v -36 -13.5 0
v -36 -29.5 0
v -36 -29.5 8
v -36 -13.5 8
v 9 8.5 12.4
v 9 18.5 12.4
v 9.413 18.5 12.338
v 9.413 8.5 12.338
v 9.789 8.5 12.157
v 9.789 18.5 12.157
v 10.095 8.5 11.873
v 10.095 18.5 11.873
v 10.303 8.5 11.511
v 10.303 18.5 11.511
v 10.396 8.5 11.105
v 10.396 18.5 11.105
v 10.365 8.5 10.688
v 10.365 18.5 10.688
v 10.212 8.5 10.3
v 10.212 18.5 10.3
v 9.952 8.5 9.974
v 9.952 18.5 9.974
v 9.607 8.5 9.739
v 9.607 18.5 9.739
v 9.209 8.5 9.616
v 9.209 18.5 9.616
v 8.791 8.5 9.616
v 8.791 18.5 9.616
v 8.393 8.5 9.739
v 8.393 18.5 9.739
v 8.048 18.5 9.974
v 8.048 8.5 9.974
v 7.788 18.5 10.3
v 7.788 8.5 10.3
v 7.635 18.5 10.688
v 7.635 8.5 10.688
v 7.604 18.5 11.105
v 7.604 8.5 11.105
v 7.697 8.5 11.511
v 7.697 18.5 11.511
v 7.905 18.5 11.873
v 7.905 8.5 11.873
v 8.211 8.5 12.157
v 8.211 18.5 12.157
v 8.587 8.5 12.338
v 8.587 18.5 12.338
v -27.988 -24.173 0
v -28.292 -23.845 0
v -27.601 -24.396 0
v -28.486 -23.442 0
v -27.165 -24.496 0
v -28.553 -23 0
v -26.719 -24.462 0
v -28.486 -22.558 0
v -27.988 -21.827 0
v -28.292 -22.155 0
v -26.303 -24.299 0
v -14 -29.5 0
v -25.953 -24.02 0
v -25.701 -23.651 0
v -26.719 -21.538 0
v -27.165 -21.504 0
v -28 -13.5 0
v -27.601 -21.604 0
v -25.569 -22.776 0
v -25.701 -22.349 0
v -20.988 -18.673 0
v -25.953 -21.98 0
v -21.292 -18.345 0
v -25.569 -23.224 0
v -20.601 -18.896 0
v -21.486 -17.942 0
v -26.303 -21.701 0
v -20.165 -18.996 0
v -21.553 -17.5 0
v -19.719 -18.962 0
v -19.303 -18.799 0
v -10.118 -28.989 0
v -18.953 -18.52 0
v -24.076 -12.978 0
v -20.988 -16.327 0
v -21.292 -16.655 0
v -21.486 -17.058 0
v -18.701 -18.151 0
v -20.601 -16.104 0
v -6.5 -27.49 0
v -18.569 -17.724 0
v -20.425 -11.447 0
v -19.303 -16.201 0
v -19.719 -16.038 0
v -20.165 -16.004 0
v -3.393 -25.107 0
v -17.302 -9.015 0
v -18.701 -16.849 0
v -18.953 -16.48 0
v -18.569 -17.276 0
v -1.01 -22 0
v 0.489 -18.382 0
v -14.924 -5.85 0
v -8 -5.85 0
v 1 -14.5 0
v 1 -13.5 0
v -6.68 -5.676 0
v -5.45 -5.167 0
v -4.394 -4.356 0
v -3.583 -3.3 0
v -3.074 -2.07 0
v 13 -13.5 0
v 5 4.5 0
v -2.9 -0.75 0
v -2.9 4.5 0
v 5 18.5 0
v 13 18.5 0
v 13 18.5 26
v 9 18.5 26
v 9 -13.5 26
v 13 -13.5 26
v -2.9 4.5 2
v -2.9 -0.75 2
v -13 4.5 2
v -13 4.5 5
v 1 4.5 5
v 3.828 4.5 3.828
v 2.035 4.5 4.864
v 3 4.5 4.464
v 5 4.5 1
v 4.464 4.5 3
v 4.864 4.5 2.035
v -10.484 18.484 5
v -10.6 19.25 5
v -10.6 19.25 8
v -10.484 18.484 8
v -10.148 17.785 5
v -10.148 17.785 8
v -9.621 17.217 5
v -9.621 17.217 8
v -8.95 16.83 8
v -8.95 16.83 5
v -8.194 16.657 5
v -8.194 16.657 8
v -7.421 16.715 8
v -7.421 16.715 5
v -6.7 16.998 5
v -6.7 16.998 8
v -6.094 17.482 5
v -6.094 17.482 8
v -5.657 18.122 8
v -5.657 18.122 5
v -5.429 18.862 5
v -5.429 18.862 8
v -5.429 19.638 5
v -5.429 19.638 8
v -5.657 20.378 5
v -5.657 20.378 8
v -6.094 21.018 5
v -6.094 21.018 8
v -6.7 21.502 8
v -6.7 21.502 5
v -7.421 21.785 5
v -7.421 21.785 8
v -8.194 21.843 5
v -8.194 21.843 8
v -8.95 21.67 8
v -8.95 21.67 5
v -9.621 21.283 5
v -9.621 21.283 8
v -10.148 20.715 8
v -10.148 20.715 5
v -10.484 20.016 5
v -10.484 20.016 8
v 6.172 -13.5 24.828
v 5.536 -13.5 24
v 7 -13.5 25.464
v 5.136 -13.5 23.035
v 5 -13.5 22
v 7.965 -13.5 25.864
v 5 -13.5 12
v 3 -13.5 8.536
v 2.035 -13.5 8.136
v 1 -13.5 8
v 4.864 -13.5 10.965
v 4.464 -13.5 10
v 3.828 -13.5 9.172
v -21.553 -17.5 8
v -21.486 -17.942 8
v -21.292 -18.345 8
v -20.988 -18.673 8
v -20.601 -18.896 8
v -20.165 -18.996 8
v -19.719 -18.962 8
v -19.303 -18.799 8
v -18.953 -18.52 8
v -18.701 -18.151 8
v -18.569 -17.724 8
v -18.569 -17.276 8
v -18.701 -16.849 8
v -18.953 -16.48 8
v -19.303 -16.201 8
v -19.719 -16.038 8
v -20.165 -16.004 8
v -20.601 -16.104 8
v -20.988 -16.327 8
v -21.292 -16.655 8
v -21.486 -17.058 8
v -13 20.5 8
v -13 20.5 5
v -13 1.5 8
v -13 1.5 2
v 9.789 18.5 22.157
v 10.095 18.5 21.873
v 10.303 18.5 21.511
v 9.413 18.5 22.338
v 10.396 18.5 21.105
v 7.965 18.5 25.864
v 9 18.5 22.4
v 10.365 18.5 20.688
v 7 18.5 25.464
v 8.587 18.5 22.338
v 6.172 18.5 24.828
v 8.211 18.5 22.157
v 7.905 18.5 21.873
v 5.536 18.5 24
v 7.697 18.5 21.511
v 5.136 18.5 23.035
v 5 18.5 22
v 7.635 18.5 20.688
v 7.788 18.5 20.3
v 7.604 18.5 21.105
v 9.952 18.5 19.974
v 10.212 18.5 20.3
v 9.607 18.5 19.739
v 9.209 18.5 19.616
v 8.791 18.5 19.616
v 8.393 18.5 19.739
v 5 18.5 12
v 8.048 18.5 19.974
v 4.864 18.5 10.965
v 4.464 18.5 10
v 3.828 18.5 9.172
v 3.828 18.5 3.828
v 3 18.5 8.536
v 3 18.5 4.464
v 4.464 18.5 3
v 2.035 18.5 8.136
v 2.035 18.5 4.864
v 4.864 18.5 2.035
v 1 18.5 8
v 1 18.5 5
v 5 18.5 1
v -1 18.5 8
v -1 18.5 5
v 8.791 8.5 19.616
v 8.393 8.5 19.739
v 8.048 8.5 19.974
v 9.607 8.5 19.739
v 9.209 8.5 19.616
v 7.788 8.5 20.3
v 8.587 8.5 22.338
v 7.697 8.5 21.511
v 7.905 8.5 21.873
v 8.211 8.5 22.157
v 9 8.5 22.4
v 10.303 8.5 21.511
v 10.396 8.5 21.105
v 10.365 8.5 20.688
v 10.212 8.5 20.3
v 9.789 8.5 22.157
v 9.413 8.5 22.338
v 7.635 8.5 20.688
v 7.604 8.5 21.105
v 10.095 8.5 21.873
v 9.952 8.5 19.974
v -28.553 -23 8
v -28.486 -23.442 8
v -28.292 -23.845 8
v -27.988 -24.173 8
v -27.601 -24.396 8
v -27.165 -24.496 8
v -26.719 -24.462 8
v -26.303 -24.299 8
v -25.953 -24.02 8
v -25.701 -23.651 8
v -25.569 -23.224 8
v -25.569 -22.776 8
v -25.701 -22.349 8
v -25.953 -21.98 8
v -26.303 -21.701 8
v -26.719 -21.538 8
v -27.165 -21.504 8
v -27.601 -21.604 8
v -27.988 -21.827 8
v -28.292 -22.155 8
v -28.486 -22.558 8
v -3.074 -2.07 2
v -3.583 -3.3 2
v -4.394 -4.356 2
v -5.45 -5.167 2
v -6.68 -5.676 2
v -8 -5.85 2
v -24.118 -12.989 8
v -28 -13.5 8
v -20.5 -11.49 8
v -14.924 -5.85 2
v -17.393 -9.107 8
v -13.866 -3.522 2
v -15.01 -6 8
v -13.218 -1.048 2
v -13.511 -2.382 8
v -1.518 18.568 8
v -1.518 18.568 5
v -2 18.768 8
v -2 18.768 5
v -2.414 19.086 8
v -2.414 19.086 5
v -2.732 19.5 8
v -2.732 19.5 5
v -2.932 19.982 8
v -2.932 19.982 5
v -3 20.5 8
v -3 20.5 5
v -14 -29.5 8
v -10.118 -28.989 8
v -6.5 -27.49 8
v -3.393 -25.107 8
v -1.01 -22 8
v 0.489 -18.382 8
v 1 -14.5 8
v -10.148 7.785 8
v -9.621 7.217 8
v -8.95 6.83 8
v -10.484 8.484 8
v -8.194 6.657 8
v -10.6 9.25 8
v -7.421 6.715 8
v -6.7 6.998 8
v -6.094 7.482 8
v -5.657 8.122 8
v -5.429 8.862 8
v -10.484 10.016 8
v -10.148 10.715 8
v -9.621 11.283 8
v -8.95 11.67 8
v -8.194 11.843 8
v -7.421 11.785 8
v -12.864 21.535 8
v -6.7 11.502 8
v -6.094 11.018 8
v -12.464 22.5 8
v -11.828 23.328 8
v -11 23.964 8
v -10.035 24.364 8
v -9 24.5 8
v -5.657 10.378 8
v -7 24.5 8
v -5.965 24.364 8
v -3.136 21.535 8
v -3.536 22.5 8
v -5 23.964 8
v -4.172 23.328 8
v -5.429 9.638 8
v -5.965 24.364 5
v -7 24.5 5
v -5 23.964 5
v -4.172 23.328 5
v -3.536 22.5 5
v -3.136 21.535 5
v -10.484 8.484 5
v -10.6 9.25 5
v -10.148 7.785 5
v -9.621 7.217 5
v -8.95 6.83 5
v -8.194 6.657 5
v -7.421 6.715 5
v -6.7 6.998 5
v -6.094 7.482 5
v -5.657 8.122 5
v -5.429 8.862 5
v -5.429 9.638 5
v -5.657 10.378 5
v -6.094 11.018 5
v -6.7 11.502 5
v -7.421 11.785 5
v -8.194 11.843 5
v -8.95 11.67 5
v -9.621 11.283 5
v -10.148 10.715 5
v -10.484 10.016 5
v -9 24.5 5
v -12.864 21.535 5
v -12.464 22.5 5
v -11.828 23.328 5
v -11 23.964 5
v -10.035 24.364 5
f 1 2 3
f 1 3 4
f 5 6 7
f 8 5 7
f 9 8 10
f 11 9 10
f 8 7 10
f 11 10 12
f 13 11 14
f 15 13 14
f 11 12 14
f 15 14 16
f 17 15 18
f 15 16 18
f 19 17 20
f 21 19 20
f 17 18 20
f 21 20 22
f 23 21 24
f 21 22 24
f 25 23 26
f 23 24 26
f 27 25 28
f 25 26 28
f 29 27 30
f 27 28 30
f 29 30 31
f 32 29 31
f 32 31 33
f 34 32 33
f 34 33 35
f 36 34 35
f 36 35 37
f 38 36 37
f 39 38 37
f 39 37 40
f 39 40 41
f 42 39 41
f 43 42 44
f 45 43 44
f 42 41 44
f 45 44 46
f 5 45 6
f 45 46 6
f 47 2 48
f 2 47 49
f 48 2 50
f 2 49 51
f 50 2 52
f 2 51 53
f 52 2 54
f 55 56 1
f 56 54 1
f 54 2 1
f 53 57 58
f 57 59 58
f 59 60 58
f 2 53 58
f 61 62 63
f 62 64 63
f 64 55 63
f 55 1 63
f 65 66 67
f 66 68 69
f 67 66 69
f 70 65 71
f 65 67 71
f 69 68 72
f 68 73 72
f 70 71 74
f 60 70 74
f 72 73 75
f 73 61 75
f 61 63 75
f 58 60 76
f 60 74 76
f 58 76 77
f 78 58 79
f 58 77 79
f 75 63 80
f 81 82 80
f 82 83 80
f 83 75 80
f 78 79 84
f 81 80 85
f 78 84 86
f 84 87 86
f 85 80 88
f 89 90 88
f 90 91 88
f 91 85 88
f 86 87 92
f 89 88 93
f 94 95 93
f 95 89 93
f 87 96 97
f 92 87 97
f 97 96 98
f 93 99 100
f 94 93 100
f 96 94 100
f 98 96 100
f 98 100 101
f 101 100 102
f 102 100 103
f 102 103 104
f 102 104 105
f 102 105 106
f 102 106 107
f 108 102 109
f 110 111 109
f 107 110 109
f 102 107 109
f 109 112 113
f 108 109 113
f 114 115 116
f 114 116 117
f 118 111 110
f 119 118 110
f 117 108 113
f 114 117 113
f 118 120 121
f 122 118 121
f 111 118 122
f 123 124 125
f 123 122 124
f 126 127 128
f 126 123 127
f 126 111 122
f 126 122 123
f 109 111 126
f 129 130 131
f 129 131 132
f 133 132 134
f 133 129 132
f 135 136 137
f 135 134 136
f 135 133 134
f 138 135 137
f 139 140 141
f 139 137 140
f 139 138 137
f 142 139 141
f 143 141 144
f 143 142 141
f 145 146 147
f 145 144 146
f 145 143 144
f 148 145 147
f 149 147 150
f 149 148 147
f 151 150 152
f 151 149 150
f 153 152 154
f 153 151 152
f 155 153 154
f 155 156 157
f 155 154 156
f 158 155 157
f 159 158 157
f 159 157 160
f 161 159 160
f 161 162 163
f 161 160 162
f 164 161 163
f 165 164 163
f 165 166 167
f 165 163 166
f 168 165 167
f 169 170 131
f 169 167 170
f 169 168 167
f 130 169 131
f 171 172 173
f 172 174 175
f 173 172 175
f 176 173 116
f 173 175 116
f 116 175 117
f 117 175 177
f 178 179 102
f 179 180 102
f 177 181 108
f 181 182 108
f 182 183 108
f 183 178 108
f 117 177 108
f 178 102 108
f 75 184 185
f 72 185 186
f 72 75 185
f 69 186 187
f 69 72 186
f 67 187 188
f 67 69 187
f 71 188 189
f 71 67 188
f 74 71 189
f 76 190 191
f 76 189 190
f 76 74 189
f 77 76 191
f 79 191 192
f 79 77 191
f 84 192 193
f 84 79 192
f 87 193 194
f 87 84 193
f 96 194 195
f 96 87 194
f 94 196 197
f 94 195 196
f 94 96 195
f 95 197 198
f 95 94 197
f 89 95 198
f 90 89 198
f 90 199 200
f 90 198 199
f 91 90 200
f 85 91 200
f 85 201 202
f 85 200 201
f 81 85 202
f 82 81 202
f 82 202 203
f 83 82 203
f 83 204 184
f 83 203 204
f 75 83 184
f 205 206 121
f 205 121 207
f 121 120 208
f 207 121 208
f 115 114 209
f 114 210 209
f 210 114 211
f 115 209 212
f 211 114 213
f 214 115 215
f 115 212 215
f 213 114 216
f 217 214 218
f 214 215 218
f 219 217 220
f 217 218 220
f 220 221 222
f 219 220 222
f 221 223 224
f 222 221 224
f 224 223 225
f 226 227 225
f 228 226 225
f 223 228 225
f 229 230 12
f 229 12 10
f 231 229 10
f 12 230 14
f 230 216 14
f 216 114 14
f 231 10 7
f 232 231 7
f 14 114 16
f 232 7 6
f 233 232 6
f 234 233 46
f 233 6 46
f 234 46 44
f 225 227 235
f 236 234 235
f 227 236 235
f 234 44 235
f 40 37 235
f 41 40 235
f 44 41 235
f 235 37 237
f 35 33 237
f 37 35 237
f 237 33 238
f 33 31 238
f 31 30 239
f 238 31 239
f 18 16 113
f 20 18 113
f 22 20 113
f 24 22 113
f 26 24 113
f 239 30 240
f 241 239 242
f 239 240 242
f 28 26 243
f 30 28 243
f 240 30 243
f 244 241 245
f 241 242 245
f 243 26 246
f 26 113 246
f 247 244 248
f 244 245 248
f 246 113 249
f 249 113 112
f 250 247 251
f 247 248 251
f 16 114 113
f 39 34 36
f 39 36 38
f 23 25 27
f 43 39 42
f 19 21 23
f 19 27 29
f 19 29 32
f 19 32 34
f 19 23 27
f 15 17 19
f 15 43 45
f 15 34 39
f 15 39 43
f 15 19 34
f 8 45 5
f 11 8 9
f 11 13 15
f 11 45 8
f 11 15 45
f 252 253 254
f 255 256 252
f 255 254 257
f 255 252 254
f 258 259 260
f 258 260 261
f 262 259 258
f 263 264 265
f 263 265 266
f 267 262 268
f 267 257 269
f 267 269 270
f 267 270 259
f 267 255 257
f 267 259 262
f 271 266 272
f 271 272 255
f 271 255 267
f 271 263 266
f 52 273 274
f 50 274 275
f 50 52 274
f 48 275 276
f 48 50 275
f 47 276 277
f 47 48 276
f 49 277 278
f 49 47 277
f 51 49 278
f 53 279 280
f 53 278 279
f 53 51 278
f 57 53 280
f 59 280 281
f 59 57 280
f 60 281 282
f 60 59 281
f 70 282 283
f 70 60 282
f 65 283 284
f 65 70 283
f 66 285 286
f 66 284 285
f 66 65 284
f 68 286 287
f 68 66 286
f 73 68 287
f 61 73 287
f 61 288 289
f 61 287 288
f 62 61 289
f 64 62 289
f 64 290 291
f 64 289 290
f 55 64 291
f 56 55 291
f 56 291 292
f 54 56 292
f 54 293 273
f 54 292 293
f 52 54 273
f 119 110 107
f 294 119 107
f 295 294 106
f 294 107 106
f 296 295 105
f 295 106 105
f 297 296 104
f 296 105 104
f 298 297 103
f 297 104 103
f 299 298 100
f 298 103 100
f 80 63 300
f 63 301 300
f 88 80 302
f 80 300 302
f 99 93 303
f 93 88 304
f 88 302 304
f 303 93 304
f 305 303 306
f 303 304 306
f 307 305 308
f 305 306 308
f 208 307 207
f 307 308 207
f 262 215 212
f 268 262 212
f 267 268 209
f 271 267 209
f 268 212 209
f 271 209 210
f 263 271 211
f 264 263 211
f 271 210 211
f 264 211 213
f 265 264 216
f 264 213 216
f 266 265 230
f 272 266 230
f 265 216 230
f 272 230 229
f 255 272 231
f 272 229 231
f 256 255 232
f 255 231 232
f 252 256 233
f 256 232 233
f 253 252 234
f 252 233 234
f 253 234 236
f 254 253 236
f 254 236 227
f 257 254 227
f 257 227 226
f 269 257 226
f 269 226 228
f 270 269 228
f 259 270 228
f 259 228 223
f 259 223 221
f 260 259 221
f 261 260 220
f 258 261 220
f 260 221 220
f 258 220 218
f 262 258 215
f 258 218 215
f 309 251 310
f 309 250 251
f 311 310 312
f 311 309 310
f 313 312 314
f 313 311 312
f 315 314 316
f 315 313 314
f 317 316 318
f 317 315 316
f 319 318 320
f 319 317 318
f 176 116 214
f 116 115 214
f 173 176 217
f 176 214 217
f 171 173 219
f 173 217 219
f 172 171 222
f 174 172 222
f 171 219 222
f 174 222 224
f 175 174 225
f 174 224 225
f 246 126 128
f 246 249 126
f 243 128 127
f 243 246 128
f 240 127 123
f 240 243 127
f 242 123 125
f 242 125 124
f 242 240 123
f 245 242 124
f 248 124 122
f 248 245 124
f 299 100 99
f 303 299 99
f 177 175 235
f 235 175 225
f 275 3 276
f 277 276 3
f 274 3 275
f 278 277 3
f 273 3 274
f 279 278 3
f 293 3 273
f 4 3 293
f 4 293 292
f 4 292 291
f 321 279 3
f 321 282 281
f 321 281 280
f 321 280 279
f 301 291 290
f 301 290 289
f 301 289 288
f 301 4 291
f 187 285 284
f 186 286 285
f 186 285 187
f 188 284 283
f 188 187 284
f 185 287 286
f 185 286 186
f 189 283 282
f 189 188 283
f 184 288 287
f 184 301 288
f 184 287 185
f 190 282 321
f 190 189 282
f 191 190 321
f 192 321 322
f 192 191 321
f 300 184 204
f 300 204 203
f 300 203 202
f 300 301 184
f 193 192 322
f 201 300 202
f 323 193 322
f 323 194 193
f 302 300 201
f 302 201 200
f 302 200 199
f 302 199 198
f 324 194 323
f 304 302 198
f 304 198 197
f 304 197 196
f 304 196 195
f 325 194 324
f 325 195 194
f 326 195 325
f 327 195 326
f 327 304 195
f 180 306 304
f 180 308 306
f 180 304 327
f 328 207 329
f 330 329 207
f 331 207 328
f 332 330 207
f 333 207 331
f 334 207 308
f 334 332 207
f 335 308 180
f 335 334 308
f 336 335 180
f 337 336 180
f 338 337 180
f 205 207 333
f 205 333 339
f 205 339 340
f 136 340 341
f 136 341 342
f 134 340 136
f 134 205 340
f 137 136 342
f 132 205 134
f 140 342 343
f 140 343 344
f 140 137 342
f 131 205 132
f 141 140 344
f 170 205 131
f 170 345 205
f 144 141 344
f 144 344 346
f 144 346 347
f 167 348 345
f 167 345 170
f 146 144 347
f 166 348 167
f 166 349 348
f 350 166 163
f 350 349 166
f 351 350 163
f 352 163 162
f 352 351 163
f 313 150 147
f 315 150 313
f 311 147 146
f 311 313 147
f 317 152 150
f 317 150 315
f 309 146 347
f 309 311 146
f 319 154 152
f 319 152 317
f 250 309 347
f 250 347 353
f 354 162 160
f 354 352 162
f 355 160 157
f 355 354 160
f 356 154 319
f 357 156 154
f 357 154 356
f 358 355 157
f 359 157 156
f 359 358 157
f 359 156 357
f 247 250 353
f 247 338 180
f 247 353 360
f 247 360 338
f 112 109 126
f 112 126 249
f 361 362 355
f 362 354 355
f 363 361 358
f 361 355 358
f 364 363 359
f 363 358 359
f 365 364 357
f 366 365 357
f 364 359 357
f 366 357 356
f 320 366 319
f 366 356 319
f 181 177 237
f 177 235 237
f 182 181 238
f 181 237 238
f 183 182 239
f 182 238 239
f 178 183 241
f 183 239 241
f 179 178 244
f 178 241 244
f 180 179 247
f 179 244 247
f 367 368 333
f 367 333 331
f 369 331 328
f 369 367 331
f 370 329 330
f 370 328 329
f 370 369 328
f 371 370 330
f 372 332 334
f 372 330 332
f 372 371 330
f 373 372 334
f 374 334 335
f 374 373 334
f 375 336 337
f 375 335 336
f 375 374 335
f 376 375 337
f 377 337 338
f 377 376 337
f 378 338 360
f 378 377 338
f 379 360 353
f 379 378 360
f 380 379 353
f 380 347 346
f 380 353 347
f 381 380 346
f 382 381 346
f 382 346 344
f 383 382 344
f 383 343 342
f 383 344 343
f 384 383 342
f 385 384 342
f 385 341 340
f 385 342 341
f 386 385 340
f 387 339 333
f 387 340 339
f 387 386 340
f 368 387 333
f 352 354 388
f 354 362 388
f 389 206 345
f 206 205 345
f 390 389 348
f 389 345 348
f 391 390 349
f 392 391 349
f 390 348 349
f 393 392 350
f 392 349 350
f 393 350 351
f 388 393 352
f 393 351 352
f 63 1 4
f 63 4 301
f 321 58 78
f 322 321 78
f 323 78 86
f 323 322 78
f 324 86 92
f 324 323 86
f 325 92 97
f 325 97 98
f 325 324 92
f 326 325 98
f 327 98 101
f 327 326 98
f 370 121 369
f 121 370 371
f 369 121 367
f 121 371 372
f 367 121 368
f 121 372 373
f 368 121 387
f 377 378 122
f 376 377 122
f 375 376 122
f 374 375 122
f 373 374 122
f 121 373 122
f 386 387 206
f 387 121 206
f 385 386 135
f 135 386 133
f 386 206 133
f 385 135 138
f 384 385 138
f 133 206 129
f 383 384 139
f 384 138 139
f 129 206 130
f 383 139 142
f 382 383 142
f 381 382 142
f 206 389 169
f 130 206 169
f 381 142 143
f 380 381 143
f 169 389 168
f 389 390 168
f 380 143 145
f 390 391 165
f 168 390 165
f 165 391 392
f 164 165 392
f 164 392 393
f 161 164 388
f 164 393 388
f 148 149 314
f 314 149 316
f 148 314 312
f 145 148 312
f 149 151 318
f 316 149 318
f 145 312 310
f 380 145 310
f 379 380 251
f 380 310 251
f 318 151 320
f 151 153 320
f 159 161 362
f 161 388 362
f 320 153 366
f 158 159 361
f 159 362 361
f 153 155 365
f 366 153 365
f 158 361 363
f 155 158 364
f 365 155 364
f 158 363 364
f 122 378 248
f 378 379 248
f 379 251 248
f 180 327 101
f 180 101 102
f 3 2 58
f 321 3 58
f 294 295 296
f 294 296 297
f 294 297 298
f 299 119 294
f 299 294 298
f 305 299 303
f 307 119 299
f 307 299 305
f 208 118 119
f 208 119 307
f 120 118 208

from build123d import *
from OCP.BRepFilletAPI import BRepFilletAPI_MakeFillet

# Parameters (mm, degrees)
SKETCH1_R           = 2.6
BOSS_EXTRUDE1_DEPTH = 26
SKETCH2_W           = 18
SKETCH2_H           = 20
CUT_EXTRUDE1_DEPTH  = 5
CUT_EXTRUDE2_START  = 26
SKETCH3_W           = 18
SKETCH3_H           = 38
CUT_EXTRUDE2_DEPTH  = 18
CUT_EXTRUDE3_START  = 18.5
SKETCH4_R           = 1.4
CUT_EXTRUDE3_DEPTH  = 10
FILLET1_R           = 4
FILLET1_R_2         = 2
CUT_EXTRUDE4_DEPTH  = 2
SKETCH6_W           = 37
SKETCH6_H           = 16
BOSS_EXTRUDE2_DEPTH = 8
FILLET2_R           = 15
SKETCH7_R           = 1.5
CUT_EXTRUDE5_DEPTH  = 22


with BuildPart() as part:
    # Sketch1 → Boss-Extrude1 (new body)
    with BuildSketch(Plane.XY):
        Polygon((-13, -13.5), (13, -13.5), (13, 18.5), (-3, 18.5), (-3, 24.5), (-13, 24.5), (-13, 13.5), align=None)
        with Locations(Location((-8, 19.25, 0), (0, 0, 180))):
            Circle(SKETCH1_R, mode=Mode.SUBTRACT)
        with Locations(Location((-8, 9.25, 0), (0, 0, 180))):
            Circle(SKETCH1_R, mode=Mode.SUBTRACT)
    extrude(amount=BOSS_EXTRUDE1_DEPTH)

    # Sketch2 → Cut-Extrude1 (cut)
    with BuildSketch(Plane.XY):
        with Locations((-4, 14.5)):
            Rectangle(SKETCH2_W, SKETCH2_H)
    extrude(amount=CUT_EXTRUDE1_DEPTH, mode=Mode.SUBTRACT)

    # Sketch3 → Cut-Extrude2 (cut)
    with BuildSketch(Plane.XY.offset(CUT_EXTRUDE2_START)):
        with Locations((-4, 5.5)):
            Rectangle(SKETCH3_W, SKETCH3_H)
    extrude(amount=-CUT_EXTRUDE2_DEPTH, mode=Mode.SUBTRACT)

    # Sketch4 → Cut-Extrude3 (cut)
    with BuildSketch(Plane(origin=(0, 0, 0), x_dir=(1, 0, 0), z_dir=(0, 1, 0)).offset(CUT_EXTRUDE3_START)):
        with Locations(Location((9, -11, 0), (0, 0, 270))):
            Circle(SKETCH4_R)
        with Locations(Location((9, -21, 0), (0, 0, 270))):
            Circle(SKETCH4_R)
    extrude(amount=-CUT_EXTRUDE3_DEPTH, mode=Mode.SUBTRACT)

    # Fillet1
    fillet1_edges_1 = [part.edges().sort_by_distance(p)[0] for p in [
        (-3, 24.5, 6.5),
        (-13, 24.5, 6.5),
        (5, 11.5, 5),
        (5, 2.5, 8),
        (5, 2.5, 26),
    ]]
    fillet1_edges_2 = [part.edges().sort_by_distance(p)[0] for p in [
        (-3, 18.5, 6.5),
    ]]
    fillet1 = BRepFilletAPI_MakeFillet(part.part.solid().wrapped)
    for e in fillet1_edges_1:
        fillet1.Add(FILLET1_R - 0.0001, e.wrapped)
    for e in fillet1_edges_2:
        fillet1.Add(FILLET1_R_2 - 0.0001, e.wrapped)
    add(Compound.cast(fillet1.Shape()), mode=Mode.REPLACE)  # a hair under: the kernel refuses the full size

    # Sketch5 → Cut-Extrude4 (cut)
    with BuildSketch(Plane.XY):
        with BuildLine():
            Line((-8, -5.85), (-13, -5.85))
            Line((-13, -5.85), (-13, 4.5))
            Line((-13, 4.5), (-8, 4.5))
            Line((-8, 4.5), (-2.9, 4.5))
            Line((-2.9, 4.5), (-2.9, -0.75))
            ThreePointArc((-2.9, -0.75), (-4.393755416, -4.356244584), (-8, -5.85))
        make_face()
    extrude(amount=CUT_EXTRUDE4_DEPTH, mode=Mode.SUBTRACT)

    # Sketch6 → Boss-Extrude2 (add)
    with BuildSketch(Plane.XY):
        with Locations((-17.5, -21.5)):
            Rectangle(SKETCH6_W, SKETCH6_H)
    extrude(amount=BOSS_EXTRUDE2_DEPTH)

    # Fillet2
    fillet2_edges = [part.edges().sort_by_distance(p)[0] for p in [
        (-13, -13.5, 4),
        (1, -29.5, 4),
    ]]
    fillet(fillet2_edges, radius=FILLET2_R)

    # Sketch7 → Cut-Extrude5 (cut)
    with BuildSketch(Plane.XY):
        with Locations(Location((-20.052596491, -17.5, 0), (0, 0, 180))):
            Circle(SKETCH7_R)
        with Locations(Location((-27.052596491, -23, 0), (0, 0, 180))):
            Circle(SKETCH7_R)
    extrude(amount=CUT_EXTRUDE5_DEPTH, mode=Mode.SUBTRACT)


solid = part.part
